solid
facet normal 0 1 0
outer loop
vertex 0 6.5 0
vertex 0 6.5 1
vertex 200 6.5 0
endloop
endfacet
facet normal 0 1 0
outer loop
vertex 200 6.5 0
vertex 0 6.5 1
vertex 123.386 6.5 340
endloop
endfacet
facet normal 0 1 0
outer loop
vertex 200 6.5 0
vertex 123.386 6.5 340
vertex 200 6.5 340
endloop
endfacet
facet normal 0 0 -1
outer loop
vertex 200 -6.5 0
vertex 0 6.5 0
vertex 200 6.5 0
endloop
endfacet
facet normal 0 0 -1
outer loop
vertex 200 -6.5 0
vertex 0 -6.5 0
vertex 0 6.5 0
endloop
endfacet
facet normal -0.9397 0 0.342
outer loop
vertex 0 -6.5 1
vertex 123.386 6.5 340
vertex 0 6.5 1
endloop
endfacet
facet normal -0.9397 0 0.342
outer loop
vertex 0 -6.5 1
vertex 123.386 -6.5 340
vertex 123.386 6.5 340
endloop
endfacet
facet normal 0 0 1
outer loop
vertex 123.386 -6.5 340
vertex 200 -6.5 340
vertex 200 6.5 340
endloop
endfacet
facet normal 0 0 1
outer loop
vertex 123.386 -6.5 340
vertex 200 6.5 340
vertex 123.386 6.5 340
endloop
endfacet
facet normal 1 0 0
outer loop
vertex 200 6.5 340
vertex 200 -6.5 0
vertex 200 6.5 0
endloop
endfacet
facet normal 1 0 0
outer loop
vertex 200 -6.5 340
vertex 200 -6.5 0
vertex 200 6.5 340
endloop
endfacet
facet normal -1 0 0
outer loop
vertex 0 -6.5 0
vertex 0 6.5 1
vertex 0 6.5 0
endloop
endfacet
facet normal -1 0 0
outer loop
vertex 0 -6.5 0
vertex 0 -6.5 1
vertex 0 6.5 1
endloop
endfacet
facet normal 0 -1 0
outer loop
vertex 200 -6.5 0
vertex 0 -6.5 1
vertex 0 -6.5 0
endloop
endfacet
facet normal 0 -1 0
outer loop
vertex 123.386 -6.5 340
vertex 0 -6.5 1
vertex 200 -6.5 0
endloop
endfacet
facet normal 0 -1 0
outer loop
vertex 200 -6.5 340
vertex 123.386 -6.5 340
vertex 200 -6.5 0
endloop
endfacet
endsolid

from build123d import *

# Parameters (mm, degrees)
PAD_DEPTH = 6.5


with BuildPart() as part:
    # Sketch → Pad (new body, symmetric)
    with BuildSketch(Plane.XZ):
        Polygon((0, 0), (200, 0), (200, 340), (123.385909, 340), (0, 1), align=None)
    extrude(amount=PAD_DEPTH, both=True)


solid = part.part
